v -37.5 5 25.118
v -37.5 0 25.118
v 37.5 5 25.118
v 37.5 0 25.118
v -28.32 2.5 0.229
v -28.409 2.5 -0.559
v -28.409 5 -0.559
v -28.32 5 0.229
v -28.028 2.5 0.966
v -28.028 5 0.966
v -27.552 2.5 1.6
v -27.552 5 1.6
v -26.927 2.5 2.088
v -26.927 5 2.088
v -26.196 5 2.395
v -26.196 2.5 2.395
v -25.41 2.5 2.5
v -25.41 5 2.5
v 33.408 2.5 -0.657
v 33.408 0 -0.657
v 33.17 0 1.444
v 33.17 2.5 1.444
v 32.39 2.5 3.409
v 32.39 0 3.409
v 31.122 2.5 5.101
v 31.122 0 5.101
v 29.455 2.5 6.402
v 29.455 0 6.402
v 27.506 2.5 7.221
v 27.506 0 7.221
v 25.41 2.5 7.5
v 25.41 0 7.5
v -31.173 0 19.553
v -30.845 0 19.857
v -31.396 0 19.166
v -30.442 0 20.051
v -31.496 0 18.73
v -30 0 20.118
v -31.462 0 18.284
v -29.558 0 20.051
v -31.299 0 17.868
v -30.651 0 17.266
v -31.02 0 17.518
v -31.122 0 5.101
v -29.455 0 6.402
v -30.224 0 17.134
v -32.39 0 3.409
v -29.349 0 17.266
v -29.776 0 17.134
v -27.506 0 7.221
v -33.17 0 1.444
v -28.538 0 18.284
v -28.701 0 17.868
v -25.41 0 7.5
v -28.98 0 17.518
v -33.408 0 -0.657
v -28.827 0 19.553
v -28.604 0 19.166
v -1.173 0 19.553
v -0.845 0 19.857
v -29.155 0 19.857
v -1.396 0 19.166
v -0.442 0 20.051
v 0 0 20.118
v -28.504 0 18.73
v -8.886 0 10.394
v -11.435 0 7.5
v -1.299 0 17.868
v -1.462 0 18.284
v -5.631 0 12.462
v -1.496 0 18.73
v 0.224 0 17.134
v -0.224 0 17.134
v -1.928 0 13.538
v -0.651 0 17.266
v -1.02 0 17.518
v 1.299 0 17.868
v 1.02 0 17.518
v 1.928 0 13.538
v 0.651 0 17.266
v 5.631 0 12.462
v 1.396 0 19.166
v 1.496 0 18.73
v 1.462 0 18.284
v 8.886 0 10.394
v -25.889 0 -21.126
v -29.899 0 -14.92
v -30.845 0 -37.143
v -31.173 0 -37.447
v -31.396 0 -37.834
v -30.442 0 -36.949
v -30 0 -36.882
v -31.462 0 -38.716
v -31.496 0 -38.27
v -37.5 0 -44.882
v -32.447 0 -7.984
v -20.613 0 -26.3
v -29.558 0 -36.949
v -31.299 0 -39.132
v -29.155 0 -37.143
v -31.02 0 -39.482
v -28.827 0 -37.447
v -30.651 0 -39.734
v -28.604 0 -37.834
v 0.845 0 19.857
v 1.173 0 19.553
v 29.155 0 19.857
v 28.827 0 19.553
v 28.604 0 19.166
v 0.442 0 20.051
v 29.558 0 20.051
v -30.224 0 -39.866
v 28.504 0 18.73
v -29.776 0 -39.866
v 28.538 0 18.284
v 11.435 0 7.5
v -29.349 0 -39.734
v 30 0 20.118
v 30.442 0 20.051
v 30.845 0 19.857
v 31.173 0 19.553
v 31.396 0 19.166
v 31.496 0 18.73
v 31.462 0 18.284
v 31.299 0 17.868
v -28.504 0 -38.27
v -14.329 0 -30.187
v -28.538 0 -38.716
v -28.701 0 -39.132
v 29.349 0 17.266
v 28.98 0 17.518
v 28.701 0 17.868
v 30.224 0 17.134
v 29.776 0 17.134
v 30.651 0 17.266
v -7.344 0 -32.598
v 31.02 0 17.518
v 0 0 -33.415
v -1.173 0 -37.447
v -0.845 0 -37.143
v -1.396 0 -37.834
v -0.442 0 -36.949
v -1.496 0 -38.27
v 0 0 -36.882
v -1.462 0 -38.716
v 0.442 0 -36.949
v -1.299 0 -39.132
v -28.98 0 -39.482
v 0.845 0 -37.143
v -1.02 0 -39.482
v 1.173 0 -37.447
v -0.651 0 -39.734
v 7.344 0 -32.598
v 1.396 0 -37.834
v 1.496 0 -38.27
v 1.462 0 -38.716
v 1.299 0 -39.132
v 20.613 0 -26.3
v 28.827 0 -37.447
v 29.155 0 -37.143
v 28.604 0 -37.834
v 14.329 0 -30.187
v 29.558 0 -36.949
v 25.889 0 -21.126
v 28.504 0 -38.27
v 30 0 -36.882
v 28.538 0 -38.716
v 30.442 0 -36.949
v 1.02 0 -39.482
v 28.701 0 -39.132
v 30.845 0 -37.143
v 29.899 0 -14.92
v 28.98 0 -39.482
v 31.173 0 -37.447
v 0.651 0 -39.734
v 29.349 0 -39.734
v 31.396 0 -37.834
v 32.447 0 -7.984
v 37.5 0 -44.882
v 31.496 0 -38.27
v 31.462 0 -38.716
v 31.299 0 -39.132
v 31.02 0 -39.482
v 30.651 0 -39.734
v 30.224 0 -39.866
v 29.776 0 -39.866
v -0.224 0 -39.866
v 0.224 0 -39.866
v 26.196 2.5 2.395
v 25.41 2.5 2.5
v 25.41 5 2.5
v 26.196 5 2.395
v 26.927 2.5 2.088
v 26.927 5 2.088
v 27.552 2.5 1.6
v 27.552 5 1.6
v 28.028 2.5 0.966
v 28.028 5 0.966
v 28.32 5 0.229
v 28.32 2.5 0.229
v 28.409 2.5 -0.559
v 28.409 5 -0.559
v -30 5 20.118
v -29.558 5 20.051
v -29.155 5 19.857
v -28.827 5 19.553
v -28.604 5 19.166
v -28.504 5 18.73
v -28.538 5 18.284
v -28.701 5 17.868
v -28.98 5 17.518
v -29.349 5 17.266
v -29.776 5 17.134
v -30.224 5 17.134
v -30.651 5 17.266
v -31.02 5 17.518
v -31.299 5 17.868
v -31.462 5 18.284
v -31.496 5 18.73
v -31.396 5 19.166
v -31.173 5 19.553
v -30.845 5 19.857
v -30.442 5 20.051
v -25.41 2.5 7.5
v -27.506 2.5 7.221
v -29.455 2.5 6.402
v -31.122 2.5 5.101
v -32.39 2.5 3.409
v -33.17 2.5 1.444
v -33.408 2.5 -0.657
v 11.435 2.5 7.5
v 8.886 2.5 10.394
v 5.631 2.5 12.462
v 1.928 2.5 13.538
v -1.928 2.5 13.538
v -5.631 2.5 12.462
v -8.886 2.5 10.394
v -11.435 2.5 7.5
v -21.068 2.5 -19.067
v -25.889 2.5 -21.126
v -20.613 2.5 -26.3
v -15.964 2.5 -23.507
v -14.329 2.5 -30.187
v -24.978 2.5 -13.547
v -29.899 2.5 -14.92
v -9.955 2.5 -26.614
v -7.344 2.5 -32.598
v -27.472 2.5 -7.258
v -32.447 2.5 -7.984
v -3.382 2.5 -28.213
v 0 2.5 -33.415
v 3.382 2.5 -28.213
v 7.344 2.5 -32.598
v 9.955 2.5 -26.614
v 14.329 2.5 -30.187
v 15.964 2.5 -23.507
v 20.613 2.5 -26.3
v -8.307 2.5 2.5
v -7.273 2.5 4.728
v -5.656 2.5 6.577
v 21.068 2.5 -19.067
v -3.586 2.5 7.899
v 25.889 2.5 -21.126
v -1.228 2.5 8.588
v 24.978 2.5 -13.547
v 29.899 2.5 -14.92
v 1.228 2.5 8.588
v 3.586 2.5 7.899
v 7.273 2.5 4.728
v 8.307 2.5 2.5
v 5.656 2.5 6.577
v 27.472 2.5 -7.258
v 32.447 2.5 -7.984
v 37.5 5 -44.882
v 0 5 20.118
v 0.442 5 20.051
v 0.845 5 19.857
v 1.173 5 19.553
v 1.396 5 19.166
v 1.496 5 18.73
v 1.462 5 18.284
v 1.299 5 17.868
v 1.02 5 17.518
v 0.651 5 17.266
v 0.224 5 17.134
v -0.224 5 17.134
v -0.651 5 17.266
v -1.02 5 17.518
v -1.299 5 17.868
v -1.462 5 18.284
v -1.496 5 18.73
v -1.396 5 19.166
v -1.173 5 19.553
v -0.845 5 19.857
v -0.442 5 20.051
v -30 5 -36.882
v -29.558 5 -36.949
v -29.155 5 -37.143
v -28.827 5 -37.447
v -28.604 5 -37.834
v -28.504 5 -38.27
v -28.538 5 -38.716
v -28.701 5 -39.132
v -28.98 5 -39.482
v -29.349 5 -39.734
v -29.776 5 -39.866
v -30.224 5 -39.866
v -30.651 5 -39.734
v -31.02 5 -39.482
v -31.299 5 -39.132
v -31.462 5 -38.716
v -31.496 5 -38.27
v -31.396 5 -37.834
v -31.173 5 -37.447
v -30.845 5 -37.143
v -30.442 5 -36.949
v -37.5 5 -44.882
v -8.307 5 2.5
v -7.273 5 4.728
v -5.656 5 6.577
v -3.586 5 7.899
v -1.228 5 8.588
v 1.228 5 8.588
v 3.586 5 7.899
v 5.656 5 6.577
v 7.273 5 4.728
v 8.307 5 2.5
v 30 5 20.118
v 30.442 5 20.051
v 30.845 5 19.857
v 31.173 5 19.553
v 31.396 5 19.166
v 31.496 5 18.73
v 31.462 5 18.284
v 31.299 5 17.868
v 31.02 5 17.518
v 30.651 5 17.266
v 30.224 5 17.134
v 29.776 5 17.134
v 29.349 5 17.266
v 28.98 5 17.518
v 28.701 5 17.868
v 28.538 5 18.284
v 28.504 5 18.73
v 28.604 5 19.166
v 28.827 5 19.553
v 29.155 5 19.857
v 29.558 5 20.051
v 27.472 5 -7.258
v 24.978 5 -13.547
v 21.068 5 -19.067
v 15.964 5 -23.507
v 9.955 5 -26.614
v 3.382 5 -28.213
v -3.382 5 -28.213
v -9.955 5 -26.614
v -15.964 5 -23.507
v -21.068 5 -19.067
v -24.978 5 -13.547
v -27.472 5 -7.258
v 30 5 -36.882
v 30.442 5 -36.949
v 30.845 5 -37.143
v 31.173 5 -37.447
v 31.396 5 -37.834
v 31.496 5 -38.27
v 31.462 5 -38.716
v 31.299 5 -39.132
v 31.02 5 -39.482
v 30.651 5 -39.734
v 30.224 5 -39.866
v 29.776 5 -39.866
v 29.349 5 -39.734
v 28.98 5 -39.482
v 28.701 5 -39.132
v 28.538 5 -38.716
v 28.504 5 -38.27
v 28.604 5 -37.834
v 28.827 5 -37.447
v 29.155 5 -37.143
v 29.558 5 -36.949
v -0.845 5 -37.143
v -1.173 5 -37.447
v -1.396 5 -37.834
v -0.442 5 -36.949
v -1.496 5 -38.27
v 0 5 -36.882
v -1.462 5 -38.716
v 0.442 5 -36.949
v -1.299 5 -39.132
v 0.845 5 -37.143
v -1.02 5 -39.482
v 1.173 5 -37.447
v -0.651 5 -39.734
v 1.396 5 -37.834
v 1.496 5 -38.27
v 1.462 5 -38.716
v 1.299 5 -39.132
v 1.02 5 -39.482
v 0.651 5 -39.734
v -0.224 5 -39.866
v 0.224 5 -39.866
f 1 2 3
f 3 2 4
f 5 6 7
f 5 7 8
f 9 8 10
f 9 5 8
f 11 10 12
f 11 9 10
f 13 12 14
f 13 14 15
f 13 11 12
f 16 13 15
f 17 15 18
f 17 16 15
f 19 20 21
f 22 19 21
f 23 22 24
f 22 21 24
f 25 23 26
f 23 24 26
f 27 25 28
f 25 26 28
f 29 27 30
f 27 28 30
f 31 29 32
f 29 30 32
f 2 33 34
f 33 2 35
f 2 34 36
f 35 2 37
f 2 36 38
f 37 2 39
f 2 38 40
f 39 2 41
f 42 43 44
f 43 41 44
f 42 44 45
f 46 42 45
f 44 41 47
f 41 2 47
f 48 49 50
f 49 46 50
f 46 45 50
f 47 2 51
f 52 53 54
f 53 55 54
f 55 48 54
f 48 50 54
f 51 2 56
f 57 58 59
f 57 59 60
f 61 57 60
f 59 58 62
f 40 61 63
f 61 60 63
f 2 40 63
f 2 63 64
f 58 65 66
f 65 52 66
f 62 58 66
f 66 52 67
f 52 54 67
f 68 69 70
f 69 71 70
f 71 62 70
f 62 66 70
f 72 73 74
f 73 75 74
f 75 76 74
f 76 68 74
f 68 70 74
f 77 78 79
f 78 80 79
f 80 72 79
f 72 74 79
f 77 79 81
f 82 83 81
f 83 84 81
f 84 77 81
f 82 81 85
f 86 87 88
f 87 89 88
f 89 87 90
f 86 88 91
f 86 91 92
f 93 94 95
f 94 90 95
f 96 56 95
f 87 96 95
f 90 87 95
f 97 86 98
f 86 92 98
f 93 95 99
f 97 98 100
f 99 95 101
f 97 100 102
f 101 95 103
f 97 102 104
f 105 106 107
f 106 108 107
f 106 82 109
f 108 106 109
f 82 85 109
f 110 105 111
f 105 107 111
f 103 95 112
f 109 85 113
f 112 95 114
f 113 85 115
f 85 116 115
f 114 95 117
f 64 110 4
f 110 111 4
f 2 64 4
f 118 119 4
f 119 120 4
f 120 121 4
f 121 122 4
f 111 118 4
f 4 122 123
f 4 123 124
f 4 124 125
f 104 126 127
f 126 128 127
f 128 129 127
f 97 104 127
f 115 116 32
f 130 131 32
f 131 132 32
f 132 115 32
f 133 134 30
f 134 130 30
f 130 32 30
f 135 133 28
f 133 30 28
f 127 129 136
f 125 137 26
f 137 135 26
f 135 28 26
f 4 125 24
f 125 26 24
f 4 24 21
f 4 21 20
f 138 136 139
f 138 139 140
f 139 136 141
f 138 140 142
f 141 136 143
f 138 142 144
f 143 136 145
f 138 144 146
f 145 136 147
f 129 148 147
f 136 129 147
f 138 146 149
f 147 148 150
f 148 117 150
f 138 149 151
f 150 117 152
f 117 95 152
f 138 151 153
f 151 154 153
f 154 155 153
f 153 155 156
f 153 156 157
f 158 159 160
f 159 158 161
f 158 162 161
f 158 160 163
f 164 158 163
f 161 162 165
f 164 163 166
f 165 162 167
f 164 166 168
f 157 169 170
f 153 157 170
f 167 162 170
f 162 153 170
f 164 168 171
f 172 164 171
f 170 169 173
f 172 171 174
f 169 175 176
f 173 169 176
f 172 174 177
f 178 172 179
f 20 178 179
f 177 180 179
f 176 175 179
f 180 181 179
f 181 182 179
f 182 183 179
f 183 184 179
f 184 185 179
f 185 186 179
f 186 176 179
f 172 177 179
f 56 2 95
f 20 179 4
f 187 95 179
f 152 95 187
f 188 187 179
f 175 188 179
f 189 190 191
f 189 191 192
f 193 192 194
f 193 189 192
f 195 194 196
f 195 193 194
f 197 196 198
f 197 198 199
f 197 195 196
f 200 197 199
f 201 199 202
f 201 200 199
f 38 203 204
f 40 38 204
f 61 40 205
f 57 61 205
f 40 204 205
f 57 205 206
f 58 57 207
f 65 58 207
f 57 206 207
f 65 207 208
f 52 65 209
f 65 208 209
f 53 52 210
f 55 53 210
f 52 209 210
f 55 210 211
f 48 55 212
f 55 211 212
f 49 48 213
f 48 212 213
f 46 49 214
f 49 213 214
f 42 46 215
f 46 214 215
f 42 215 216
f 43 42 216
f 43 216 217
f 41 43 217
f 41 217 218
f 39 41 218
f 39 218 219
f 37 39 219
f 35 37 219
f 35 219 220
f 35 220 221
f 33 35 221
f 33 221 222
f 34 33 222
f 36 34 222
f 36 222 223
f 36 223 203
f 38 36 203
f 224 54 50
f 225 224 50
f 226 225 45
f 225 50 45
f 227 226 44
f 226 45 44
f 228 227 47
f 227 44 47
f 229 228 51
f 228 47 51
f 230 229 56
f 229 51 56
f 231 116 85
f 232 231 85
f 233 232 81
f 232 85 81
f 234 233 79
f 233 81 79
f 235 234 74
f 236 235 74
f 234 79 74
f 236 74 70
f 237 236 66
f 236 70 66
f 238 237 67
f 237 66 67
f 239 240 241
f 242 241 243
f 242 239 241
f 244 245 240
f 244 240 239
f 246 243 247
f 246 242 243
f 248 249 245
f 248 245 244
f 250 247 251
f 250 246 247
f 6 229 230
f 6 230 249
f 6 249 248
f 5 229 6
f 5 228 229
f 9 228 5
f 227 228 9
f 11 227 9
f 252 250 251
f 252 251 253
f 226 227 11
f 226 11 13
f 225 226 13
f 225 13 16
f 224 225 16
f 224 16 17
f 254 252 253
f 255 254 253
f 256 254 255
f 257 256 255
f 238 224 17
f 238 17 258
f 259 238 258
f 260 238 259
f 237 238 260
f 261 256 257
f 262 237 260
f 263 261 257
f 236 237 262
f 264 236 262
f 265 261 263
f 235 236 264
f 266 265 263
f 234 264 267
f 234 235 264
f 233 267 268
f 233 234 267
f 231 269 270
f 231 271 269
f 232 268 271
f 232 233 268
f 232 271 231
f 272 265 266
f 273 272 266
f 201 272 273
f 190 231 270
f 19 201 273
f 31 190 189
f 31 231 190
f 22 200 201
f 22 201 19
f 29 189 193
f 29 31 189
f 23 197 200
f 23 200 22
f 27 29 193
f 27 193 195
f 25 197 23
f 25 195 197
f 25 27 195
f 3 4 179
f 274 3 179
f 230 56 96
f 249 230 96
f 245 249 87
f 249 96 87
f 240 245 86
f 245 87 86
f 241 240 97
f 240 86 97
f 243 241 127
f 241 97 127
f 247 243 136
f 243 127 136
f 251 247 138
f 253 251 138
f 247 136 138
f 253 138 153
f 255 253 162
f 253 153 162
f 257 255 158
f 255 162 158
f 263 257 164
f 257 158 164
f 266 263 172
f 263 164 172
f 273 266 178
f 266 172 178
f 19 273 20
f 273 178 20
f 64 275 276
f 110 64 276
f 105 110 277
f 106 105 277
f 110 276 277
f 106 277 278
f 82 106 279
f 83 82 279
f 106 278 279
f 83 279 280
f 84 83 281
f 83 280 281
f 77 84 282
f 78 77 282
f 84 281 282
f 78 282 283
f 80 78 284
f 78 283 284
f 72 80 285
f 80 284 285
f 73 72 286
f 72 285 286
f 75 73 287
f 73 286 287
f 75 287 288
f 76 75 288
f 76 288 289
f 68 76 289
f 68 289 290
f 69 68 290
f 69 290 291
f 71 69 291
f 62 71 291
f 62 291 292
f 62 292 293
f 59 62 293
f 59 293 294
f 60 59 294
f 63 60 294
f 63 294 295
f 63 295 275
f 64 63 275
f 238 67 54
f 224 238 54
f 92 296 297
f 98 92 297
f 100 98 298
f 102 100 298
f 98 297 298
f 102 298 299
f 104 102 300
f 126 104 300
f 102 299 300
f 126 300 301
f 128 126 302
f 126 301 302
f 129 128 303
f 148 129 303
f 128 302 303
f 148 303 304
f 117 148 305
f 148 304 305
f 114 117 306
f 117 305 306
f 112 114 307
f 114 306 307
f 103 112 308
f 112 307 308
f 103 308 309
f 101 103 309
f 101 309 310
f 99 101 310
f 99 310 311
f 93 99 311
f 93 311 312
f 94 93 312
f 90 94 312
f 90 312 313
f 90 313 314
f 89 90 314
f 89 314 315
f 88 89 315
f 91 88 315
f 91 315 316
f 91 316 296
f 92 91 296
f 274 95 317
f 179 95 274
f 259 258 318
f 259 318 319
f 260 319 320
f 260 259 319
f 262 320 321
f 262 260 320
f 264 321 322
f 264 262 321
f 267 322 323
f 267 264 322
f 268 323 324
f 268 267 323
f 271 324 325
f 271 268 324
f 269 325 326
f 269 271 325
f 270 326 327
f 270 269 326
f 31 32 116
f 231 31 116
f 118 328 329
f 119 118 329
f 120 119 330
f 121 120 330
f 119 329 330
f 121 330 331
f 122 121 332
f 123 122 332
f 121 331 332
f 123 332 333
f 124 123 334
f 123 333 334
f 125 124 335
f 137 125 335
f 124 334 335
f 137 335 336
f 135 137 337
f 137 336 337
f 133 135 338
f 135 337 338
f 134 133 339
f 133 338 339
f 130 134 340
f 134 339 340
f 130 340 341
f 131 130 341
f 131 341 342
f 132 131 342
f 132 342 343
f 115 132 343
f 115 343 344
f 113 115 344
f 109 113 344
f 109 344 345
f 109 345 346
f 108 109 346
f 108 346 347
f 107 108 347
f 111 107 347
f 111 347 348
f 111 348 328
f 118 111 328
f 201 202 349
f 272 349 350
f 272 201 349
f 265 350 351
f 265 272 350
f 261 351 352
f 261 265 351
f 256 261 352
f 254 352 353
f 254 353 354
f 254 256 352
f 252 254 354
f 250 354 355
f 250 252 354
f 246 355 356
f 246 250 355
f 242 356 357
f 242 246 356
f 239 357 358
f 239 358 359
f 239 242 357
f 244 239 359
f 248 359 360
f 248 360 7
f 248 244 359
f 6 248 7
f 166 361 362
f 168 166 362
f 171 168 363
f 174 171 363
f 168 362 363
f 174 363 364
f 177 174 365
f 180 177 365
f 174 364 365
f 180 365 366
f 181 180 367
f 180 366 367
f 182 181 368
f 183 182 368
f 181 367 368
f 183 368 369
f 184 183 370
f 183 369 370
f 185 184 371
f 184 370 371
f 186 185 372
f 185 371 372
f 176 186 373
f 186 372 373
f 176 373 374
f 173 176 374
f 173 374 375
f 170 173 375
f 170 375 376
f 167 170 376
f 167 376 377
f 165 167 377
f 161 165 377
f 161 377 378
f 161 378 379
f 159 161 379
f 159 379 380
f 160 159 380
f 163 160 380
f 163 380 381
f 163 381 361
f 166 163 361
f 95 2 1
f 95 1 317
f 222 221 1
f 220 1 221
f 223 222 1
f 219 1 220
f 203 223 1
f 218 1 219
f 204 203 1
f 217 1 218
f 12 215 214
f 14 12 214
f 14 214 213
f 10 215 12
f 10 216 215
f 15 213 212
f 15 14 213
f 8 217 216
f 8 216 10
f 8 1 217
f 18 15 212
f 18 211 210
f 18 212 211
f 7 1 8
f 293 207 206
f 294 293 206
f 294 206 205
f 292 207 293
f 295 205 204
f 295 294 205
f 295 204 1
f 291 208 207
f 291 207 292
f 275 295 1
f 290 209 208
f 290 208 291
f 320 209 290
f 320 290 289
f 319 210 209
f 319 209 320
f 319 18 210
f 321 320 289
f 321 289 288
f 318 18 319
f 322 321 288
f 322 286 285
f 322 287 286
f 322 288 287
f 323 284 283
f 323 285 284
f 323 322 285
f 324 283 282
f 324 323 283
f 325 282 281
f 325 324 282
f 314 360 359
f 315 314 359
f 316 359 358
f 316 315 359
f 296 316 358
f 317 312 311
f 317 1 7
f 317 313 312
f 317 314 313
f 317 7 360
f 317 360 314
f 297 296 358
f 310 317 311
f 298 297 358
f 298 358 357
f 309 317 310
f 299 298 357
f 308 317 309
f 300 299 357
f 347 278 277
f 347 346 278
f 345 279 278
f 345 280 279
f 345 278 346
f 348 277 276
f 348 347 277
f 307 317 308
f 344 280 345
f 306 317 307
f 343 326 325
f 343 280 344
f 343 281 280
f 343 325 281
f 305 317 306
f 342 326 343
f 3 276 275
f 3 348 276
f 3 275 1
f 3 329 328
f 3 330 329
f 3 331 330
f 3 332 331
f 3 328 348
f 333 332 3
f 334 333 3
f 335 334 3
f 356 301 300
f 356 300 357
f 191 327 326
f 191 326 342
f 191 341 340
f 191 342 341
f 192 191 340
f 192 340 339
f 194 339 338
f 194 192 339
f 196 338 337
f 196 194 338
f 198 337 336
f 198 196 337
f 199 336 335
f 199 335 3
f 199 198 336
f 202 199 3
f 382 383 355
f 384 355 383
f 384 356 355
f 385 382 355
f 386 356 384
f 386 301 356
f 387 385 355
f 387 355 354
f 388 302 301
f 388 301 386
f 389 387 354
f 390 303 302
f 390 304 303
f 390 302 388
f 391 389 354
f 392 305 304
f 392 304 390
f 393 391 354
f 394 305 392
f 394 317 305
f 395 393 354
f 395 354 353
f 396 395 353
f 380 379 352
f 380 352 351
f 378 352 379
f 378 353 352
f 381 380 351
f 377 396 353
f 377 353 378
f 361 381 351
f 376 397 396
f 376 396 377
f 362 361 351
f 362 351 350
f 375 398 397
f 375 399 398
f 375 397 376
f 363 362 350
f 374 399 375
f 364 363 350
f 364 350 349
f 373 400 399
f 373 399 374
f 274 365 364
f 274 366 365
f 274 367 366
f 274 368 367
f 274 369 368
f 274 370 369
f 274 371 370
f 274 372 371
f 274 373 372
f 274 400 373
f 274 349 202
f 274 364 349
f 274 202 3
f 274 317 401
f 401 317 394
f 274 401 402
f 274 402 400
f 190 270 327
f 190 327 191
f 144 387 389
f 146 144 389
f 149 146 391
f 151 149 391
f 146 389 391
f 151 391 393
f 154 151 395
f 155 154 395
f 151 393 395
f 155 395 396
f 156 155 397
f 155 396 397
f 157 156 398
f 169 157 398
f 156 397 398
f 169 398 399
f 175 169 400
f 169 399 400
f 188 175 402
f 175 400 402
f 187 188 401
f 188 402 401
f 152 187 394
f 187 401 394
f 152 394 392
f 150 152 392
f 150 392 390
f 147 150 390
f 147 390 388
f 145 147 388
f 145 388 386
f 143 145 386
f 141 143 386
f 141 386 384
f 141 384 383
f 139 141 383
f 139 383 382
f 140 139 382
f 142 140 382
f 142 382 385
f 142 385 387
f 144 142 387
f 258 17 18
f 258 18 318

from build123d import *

# Parameters (mm, degrees)
SKETCH1_W           = 75
SKETCH1_H           = 70
BOSS_EXTRUDE1_DEPTH = 5
SKETCH2_R           = 1.5
CUT_EXTRUDE1_DEPTH  = 59.699989832
CUT_EXTRUDE3_DEPTH  = 2.5


with BuildPart() as part:
    # Sketch1 → Boss-Extrude1 (new body)
    with BuildSketch(Plane(origin=(0, 0, 0), x_dir=(1, 0, 0), z_dir=(0, 1, 0))):
        with Locations((0, 9.8825)):
            Rectangle(SKETCH1_W, SKETCH1_H)
        with BuildLine():
            Line((-25.410018342, -2.5), (-8.306962441, -2.5))
            ThreePointArc((-8.306962441, -2.5), (0, -8.675), (8.306962441, -2.5))
            Line((8.306962441, -2.5), (25.410018342, -2.5))
            ThreePointArc((25.410018342, -2.5), (27.552103918, -1.600349825), (28.409437718, 0.559020409))
            ThreePointArc((28.409437718, 0.559020409), (0, 28.414937186), (-28.409437718, 0.559020409))
            ThreePointArc((-28.409437718, 0.559020409), (-27.552103918, -1.600349825), (-25.410018342, -2.5))
        make_face(mode=Mode.SUBTRACT)
    extrude(amount=BOSS_EXTRUDE1_DEPTH)

    # Sketch2 → Cut-Extrude1 (cut, through all)
    with BuildSketch(Plane(origin=(0, 5, 0), x_dir=(1, 0, 0), z_dir=(0, 1, 0))):
        with Locations(Location((-30, 38.3825, 0), (0, 0, 270))):
            Circle(SKETCH2_R)
        with Locations(Location((-30, -18.6175, 0), (0, 0, 270))):
            Circle(SKETCH2_R)
        with Locations(Location((0, -18.6175, 0), (0, 0, 270))):
            Circle(SKETCH2_R)
        with Locations(Location((30, -18.6175, 0), (0, 0, 270))):
            Circle(SKETCH2_R)
        with Locations(Location((30, 38.3825, 0), (0, 0, 270))):
            Circle(SKETCH2_R)
        with Locations(Location((0, 38.3825, 0), (0, 0, 270))):
            Circle(SKETCH2_R)
    extrude(amount=-CUT_EXTRUDE1_DEPTH, mode=Mode.SUBTRACT)

    # Sketch3 → Cut-Extrude3 (cut)
    with BuildSketch(Plane.XZ):
        with BuildLine():
            Line((25.410018342, 7.5), (11.434842587, 7.5))
            ThreePointArc((11.434842587, 7.5), (0, 13.675), (-11.434842587, 7.5))
            Line((-11.434842587, 7.5), (-25.410018342, 7.5))
            ThreePointArc((-25.410018342, 7.5), (-31.122246544, 5.100932866), (-33.408470011, -0.657387759))
            ThreePointArc((-33.408470011, -0.657387759), (0, -33.414937186), (33.408470011, -0.657387759))
            ThreePointArc((33.408470011, -0.657387759), (31.122246544, 5.100932866), (25.410018342, 7.5))
        make_face()
    extrude(amount=-CUT_EXTRUDE3_DEPTH, mode=Mode.SUBTRACT)


solid = part.part
